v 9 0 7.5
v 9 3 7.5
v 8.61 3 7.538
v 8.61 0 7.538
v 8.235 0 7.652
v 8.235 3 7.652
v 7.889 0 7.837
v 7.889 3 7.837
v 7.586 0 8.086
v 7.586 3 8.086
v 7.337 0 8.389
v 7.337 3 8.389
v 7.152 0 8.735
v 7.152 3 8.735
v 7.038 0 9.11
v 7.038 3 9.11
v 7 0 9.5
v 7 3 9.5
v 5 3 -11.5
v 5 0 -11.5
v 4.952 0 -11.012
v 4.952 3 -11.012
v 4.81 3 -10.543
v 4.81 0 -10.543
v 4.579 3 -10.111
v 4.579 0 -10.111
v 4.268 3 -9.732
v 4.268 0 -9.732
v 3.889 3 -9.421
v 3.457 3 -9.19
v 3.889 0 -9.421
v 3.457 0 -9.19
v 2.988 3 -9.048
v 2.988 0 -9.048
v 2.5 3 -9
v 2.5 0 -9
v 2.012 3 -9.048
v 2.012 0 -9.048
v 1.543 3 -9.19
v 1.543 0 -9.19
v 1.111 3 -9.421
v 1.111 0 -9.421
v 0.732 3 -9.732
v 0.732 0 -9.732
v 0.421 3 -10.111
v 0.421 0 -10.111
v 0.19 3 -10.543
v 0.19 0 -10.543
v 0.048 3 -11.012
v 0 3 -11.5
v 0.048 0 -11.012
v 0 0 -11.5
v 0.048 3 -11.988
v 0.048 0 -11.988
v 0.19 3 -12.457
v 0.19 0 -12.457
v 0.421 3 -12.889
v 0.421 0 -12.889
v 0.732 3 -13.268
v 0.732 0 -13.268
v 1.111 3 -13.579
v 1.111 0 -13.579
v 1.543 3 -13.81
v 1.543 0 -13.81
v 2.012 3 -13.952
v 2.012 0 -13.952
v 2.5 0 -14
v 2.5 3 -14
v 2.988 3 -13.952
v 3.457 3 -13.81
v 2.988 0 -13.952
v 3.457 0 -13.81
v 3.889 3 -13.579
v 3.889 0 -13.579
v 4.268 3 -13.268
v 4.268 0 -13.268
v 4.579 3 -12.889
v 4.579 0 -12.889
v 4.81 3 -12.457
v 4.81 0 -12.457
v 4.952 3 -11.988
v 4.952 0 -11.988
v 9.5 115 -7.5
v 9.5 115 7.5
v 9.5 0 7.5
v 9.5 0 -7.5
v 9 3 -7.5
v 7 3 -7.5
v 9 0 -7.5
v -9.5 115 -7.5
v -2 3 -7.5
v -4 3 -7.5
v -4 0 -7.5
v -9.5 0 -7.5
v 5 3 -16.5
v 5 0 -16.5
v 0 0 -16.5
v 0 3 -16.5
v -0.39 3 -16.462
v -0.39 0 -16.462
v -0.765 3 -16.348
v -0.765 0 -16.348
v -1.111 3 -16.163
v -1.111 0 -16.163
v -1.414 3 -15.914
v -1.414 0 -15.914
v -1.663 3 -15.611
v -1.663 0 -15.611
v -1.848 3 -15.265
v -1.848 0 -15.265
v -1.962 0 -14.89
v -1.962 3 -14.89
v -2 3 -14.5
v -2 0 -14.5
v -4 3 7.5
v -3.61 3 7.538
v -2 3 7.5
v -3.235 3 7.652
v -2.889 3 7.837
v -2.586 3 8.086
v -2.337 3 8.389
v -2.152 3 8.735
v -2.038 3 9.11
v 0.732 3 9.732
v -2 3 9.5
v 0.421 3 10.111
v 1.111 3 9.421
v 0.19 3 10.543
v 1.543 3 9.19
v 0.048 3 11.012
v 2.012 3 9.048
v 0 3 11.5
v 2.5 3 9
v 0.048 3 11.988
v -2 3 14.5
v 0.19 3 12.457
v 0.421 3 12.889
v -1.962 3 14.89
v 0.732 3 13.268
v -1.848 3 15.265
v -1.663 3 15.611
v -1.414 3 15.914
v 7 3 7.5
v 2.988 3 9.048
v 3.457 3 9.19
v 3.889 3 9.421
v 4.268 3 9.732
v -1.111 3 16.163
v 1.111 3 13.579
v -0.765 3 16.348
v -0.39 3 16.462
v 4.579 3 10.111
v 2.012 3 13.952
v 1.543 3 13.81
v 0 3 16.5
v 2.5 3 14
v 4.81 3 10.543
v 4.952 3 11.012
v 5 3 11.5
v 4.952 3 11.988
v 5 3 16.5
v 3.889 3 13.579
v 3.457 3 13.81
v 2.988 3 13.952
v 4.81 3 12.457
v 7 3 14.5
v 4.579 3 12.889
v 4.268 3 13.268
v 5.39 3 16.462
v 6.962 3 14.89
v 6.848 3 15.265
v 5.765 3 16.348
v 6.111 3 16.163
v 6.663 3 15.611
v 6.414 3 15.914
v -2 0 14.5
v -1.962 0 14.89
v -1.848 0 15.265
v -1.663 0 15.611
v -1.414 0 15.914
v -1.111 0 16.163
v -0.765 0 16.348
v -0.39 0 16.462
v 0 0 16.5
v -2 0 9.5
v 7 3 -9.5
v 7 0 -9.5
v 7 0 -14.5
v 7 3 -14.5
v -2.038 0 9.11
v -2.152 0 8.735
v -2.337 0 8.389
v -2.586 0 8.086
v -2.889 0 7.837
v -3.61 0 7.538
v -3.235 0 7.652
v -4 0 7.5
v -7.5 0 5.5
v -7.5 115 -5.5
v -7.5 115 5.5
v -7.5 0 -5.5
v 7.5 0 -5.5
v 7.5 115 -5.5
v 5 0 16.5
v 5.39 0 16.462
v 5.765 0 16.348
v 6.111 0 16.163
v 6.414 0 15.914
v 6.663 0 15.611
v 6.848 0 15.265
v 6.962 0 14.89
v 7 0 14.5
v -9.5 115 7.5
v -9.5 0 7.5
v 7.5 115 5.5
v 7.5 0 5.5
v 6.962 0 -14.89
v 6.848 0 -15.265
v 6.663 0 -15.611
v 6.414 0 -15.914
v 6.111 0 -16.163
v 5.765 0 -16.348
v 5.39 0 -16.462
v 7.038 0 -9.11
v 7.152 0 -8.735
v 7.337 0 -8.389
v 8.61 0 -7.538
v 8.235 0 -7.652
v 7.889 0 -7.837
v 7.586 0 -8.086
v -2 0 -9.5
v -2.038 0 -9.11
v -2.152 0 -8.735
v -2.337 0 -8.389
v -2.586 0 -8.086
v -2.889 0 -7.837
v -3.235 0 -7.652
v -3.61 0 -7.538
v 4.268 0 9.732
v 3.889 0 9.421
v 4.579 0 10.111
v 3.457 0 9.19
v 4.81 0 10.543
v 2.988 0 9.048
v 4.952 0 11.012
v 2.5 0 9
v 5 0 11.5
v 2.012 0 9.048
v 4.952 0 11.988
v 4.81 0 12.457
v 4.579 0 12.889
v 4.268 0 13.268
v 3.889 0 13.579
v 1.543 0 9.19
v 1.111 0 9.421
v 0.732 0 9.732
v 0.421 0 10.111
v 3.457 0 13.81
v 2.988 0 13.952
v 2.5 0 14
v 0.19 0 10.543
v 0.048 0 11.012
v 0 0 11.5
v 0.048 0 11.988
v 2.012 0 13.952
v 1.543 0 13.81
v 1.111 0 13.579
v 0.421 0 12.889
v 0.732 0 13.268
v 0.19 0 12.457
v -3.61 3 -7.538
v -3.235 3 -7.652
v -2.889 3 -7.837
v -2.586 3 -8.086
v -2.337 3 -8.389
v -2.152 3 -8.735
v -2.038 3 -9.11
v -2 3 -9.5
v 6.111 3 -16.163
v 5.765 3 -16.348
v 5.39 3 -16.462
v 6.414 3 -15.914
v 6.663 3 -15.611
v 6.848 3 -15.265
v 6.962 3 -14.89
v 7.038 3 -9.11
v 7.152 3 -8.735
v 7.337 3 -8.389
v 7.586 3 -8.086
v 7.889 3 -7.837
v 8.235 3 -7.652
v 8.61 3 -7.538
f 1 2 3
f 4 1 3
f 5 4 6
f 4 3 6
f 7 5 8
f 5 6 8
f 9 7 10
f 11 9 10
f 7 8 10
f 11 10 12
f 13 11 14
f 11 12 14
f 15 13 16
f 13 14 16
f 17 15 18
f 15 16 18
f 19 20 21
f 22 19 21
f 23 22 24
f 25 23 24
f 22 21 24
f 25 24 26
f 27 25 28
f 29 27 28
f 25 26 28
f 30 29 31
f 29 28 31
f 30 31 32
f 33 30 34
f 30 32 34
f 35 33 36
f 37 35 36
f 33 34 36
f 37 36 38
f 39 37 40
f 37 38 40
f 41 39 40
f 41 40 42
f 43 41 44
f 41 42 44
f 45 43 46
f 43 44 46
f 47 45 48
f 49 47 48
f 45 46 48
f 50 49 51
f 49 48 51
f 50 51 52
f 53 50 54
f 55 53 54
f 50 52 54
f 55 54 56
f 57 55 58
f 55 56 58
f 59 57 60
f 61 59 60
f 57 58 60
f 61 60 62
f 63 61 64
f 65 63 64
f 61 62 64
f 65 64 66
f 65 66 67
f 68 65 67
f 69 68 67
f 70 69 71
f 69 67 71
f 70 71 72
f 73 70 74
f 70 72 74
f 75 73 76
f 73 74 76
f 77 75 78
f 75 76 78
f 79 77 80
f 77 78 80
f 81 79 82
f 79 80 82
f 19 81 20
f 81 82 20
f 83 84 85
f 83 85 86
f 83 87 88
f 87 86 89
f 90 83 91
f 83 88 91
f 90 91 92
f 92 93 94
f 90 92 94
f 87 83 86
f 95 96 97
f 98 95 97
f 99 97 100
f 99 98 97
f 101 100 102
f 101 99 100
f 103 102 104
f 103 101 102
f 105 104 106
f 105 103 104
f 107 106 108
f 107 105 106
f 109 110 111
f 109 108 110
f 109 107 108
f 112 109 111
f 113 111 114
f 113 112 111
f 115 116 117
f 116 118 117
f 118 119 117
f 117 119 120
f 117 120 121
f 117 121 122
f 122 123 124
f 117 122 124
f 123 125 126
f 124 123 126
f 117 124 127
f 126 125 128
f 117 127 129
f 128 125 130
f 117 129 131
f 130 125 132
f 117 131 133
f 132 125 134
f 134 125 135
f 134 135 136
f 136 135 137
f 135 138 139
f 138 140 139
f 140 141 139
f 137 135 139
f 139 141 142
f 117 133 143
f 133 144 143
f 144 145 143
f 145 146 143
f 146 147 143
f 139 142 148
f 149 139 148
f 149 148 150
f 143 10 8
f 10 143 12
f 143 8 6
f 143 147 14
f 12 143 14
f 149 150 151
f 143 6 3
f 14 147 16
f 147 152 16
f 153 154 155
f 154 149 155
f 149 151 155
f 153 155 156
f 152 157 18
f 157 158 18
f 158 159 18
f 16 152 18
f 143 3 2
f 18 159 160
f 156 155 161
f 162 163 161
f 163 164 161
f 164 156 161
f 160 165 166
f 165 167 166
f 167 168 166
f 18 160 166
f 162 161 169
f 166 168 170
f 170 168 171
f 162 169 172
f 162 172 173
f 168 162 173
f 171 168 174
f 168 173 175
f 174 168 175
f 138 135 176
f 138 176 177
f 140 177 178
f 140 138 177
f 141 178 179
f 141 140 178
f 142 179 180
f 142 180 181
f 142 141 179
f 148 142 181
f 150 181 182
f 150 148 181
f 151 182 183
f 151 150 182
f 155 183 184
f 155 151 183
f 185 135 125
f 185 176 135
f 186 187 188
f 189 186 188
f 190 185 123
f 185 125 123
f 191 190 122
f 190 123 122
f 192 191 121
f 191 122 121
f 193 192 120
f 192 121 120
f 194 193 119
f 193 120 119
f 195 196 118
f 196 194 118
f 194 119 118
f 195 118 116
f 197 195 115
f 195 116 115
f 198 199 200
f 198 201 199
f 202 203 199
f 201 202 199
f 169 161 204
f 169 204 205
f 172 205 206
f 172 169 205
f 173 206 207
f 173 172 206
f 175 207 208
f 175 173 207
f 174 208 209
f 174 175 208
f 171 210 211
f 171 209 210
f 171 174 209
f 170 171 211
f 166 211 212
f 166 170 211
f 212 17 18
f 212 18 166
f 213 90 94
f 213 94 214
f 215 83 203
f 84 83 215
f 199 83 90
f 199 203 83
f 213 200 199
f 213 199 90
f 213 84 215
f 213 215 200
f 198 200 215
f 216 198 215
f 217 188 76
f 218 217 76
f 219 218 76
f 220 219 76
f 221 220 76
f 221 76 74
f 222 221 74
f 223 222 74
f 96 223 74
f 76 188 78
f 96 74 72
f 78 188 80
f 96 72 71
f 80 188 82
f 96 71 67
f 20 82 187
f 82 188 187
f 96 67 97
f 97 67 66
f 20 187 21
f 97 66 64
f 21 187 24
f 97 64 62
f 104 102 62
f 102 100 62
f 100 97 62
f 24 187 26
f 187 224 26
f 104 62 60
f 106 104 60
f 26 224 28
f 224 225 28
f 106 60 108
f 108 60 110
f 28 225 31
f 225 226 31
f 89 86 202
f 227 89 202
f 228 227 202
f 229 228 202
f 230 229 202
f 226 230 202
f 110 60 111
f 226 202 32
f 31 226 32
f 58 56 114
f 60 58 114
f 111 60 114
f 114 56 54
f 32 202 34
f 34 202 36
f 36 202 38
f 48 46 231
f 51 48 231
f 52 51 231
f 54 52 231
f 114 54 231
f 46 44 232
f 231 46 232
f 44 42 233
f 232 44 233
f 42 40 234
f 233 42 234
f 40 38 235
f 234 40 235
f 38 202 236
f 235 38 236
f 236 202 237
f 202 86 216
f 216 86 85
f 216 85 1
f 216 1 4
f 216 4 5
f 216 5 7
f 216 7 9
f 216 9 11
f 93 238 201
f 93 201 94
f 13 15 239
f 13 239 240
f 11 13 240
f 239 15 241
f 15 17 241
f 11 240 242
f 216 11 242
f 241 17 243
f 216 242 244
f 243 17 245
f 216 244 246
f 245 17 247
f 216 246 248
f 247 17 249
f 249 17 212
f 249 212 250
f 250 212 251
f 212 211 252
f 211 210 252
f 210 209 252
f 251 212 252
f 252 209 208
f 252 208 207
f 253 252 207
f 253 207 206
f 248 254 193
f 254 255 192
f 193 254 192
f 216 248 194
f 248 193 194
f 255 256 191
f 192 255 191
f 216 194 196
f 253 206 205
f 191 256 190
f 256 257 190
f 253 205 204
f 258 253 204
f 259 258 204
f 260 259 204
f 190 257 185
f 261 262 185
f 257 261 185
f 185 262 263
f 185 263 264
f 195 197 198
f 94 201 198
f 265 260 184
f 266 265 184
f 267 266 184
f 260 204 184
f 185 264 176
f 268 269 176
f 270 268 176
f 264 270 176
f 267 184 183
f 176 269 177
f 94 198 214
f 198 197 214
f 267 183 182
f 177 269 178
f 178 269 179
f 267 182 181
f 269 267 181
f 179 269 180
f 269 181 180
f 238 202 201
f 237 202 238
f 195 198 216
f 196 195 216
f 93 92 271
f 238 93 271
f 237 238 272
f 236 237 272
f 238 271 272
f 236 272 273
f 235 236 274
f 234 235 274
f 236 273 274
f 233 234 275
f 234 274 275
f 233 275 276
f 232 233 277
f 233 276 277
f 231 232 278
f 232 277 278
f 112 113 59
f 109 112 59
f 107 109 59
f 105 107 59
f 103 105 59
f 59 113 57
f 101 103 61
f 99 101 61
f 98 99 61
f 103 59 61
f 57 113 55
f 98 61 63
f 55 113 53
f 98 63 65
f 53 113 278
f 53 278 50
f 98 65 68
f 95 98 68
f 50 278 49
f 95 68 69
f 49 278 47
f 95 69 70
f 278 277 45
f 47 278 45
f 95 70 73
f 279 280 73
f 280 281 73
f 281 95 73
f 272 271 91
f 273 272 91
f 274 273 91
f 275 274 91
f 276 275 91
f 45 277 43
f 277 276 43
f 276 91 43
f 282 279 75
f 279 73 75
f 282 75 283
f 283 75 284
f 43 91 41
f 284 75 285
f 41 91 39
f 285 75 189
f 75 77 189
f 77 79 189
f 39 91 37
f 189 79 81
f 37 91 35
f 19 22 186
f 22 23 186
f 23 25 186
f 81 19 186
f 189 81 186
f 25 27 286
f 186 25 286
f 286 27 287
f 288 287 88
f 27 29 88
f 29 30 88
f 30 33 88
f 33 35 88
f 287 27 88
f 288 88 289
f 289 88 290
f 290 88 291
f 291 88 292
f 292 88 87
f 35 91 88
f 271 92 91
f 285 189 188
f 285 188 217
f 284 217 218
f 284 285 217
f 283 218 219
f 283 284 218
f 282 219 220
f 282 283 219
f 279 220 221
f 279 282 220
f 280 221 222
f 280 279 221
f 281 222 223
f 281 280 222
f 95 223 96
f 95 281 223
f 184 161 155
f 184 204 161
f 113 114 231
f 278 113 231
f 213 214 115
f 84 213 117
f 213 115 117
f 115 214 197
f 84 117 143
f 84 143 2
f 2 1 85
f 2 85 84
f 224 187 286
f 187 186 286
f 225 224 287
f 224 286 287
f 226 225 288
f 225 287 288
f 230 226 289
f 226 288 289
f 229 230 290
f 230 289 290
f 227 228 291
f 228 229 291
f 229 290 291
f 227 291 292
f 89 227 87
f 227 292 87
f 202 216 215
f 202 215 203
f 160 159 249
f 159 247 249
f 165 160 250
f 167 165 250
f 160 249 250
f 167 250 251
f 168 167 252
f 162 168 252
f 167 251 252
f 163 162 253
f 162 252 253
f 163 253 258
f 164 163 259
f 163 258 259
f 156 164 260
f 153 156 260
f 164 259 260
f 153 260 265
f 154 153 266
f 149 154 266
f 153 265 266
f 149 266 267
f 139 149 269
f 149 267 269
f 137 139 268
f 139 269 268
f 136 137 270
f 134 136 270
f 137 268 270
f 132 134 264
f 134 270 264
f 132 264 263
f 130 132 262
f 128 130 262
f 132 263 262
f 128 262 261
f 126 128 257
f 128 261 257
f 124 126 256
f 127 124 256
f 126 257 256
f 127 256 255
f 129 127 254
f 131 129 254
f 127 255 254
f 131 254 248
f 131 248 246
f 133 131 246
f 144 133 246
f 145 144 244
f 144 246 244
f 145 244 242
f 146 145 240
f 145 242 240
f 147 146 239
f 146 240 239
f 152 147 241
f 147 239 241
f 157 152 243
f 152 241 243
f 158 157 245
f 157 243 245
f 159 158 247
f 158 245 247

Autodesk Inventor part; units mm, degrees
ref_plane "YZ Plane" through (0, 0, 0) normal (1, 0, 0) x (0, 1, 0)
ref_plane "XZ Plane" through (0, 0, 0) normal (0, 1, 0) x (-1, 0, 0)
ref_plane "XY Plane" through (0, 0, 0) normal (0, 0, 1) x (1, 0, 0)
sketch "Sketch1" plane through (0, 0, 0) normal (0, 1, 0) x (-1, 0, 0)
  line L0 (9.5, 7.5) -> (-9.5, 7.5)
  line L1 (-9.5, 7.5) -> (-9.5, -7.5)
  line L2 (-9.5, -7.5) -> (9.5, -7.5)
  line L3 (9.5, -7.5) -> (9.5, 7.5)
  line L4 (9.5, 7.5) -> (-9.5, -7.5) construction
  line L5 (-9.5, 7.5) -> (9.5, -7.5) construction
  line L6 (7.5, 5.5) -> (-7.5, 5.5)
  line L7 (-7.5, 5.5) -> (-7.5, -5.5)
  line L8 (-7.5, -5.5) -> (7.5, -5.5)
  line L9 (7.5, -5.5) -> (7.5, 5.5)
  line L10 (7.5, 5.5) -> (-7.5, -5.5) construction
  line L11 (-7.5, 5.5) -> (7.5, -5.5) construction
  point P0 (0, 0)
  dimension "d0" = 19
  dimension "d1" = 15
  dimension "d2" = 2
  dimension "d3" = 2
extrude "Extrusion1" add sketch "Sketch1" along normal blind 115
sketch "Sketch3" plane through (0, 0, 0) normal (0, -1, 0) x (1, 0, 0)
  circle A0 centre (2.5, 11.5) radius 2.5
  circle A1 centre (2.5, -11.5) radius 2.5
  line L0 (-9.5, -7.5) -> (-9.5, 7.5) projected
  line L1 (-9.5, 7.5) -> (9.5, 7.5) projected
  line L2 (-2, 7.5) -> (7, 7.5)
  line L3 (7, 7.5) -> (7, 16.5)
  line L4 (7, 16.5) -> (-2, 16.5)
  line L5 (-2, 16.5) -> (-2, 7.5)
  line L6 (0, 0) -> (7.5, 0)
  line L7 (7.5, -5.5) -> (7.5, 5.5) projected
  circle A2 centre (2.5, -11.5) radius 2.5
  line L8 (-9.5, -7.5) -> (9.5, -7.5)
  line L9 (7, -7.5) -> (7, -16.5)
  line L10 (7, -16.5) -> (-2, -16.5)
  line L11 (-2, -16.5) -> (-2, -7.5)
  dimension "d13" = 5
  dimension "d14" = 5
  dimension "d15" = 23
  dimension "d16" = 11.5
  dimension "d17" = 12
  dimension "d18" = 12
  dimension "d19" = 9
  dimension "d20" = 9
  dimension "d21" = 4.5
extrude "Extrusion3" add sketch "Sketch3" against normal blind 3
fillet "Fillet2" radius 2 8 edges at (-2, 1.5, -7.5) (-2, 1.5, -16.5) (7, 1.5, -16.5) (7, 1.5, -7.5) (7, 1.5, 7.5) (7, 1.5, 16.5) (-2, 1.5, 16.5) (-2, 1.5, 7.5)
sketch "Sketch2" plane through (0, 0, 0) normal (0, -1, 0) x (1, 0, 0)
  circle A0 centre (-11.5, 0) radius 2.5
  circle A1 centre (11.5, 0) radius 2.5
  line L0 (-14.8361, 4.3238) -> (-8.1639, 4.3238)
  line L1 (-8.1639, 4.3238) -> (-8.1639, -4.3238)
  line L2 (-8.1639, -4.3238) -> (-14.8361, -4.3238)
  line L3 (-14.8361, -4.3238) -> (-14.8361, 4.3238)
  line L4 (-14.8361, 4.3238) -> (-8.1639, -4.3238) construction
  line L5 (-8.1639, 4.3238) -> (-14.8361, -4.3238) construction
  line L6 (0, 0) -> (0, 5.5)
  line L7 (7.5, 5.5) -> (-7.5, 5.5) projected
  line L8 (14.8361, 4.3238) -> (8.1639, 4.3238)
  line L9 (8.1639, 4.3238) -> (8.1639, -4.3238)
  line L10 (8.1639, -4.3238) -> (14.8361, -4.3238)
  line L11 (14.8361, -4.3238) -> (14.8361, 4.3238)
  dimension "d6" = 5
  dimension "d7" = 5
  dimension "d8" = 23
  dimension "d9" = 11.5
properties part number "neck"
